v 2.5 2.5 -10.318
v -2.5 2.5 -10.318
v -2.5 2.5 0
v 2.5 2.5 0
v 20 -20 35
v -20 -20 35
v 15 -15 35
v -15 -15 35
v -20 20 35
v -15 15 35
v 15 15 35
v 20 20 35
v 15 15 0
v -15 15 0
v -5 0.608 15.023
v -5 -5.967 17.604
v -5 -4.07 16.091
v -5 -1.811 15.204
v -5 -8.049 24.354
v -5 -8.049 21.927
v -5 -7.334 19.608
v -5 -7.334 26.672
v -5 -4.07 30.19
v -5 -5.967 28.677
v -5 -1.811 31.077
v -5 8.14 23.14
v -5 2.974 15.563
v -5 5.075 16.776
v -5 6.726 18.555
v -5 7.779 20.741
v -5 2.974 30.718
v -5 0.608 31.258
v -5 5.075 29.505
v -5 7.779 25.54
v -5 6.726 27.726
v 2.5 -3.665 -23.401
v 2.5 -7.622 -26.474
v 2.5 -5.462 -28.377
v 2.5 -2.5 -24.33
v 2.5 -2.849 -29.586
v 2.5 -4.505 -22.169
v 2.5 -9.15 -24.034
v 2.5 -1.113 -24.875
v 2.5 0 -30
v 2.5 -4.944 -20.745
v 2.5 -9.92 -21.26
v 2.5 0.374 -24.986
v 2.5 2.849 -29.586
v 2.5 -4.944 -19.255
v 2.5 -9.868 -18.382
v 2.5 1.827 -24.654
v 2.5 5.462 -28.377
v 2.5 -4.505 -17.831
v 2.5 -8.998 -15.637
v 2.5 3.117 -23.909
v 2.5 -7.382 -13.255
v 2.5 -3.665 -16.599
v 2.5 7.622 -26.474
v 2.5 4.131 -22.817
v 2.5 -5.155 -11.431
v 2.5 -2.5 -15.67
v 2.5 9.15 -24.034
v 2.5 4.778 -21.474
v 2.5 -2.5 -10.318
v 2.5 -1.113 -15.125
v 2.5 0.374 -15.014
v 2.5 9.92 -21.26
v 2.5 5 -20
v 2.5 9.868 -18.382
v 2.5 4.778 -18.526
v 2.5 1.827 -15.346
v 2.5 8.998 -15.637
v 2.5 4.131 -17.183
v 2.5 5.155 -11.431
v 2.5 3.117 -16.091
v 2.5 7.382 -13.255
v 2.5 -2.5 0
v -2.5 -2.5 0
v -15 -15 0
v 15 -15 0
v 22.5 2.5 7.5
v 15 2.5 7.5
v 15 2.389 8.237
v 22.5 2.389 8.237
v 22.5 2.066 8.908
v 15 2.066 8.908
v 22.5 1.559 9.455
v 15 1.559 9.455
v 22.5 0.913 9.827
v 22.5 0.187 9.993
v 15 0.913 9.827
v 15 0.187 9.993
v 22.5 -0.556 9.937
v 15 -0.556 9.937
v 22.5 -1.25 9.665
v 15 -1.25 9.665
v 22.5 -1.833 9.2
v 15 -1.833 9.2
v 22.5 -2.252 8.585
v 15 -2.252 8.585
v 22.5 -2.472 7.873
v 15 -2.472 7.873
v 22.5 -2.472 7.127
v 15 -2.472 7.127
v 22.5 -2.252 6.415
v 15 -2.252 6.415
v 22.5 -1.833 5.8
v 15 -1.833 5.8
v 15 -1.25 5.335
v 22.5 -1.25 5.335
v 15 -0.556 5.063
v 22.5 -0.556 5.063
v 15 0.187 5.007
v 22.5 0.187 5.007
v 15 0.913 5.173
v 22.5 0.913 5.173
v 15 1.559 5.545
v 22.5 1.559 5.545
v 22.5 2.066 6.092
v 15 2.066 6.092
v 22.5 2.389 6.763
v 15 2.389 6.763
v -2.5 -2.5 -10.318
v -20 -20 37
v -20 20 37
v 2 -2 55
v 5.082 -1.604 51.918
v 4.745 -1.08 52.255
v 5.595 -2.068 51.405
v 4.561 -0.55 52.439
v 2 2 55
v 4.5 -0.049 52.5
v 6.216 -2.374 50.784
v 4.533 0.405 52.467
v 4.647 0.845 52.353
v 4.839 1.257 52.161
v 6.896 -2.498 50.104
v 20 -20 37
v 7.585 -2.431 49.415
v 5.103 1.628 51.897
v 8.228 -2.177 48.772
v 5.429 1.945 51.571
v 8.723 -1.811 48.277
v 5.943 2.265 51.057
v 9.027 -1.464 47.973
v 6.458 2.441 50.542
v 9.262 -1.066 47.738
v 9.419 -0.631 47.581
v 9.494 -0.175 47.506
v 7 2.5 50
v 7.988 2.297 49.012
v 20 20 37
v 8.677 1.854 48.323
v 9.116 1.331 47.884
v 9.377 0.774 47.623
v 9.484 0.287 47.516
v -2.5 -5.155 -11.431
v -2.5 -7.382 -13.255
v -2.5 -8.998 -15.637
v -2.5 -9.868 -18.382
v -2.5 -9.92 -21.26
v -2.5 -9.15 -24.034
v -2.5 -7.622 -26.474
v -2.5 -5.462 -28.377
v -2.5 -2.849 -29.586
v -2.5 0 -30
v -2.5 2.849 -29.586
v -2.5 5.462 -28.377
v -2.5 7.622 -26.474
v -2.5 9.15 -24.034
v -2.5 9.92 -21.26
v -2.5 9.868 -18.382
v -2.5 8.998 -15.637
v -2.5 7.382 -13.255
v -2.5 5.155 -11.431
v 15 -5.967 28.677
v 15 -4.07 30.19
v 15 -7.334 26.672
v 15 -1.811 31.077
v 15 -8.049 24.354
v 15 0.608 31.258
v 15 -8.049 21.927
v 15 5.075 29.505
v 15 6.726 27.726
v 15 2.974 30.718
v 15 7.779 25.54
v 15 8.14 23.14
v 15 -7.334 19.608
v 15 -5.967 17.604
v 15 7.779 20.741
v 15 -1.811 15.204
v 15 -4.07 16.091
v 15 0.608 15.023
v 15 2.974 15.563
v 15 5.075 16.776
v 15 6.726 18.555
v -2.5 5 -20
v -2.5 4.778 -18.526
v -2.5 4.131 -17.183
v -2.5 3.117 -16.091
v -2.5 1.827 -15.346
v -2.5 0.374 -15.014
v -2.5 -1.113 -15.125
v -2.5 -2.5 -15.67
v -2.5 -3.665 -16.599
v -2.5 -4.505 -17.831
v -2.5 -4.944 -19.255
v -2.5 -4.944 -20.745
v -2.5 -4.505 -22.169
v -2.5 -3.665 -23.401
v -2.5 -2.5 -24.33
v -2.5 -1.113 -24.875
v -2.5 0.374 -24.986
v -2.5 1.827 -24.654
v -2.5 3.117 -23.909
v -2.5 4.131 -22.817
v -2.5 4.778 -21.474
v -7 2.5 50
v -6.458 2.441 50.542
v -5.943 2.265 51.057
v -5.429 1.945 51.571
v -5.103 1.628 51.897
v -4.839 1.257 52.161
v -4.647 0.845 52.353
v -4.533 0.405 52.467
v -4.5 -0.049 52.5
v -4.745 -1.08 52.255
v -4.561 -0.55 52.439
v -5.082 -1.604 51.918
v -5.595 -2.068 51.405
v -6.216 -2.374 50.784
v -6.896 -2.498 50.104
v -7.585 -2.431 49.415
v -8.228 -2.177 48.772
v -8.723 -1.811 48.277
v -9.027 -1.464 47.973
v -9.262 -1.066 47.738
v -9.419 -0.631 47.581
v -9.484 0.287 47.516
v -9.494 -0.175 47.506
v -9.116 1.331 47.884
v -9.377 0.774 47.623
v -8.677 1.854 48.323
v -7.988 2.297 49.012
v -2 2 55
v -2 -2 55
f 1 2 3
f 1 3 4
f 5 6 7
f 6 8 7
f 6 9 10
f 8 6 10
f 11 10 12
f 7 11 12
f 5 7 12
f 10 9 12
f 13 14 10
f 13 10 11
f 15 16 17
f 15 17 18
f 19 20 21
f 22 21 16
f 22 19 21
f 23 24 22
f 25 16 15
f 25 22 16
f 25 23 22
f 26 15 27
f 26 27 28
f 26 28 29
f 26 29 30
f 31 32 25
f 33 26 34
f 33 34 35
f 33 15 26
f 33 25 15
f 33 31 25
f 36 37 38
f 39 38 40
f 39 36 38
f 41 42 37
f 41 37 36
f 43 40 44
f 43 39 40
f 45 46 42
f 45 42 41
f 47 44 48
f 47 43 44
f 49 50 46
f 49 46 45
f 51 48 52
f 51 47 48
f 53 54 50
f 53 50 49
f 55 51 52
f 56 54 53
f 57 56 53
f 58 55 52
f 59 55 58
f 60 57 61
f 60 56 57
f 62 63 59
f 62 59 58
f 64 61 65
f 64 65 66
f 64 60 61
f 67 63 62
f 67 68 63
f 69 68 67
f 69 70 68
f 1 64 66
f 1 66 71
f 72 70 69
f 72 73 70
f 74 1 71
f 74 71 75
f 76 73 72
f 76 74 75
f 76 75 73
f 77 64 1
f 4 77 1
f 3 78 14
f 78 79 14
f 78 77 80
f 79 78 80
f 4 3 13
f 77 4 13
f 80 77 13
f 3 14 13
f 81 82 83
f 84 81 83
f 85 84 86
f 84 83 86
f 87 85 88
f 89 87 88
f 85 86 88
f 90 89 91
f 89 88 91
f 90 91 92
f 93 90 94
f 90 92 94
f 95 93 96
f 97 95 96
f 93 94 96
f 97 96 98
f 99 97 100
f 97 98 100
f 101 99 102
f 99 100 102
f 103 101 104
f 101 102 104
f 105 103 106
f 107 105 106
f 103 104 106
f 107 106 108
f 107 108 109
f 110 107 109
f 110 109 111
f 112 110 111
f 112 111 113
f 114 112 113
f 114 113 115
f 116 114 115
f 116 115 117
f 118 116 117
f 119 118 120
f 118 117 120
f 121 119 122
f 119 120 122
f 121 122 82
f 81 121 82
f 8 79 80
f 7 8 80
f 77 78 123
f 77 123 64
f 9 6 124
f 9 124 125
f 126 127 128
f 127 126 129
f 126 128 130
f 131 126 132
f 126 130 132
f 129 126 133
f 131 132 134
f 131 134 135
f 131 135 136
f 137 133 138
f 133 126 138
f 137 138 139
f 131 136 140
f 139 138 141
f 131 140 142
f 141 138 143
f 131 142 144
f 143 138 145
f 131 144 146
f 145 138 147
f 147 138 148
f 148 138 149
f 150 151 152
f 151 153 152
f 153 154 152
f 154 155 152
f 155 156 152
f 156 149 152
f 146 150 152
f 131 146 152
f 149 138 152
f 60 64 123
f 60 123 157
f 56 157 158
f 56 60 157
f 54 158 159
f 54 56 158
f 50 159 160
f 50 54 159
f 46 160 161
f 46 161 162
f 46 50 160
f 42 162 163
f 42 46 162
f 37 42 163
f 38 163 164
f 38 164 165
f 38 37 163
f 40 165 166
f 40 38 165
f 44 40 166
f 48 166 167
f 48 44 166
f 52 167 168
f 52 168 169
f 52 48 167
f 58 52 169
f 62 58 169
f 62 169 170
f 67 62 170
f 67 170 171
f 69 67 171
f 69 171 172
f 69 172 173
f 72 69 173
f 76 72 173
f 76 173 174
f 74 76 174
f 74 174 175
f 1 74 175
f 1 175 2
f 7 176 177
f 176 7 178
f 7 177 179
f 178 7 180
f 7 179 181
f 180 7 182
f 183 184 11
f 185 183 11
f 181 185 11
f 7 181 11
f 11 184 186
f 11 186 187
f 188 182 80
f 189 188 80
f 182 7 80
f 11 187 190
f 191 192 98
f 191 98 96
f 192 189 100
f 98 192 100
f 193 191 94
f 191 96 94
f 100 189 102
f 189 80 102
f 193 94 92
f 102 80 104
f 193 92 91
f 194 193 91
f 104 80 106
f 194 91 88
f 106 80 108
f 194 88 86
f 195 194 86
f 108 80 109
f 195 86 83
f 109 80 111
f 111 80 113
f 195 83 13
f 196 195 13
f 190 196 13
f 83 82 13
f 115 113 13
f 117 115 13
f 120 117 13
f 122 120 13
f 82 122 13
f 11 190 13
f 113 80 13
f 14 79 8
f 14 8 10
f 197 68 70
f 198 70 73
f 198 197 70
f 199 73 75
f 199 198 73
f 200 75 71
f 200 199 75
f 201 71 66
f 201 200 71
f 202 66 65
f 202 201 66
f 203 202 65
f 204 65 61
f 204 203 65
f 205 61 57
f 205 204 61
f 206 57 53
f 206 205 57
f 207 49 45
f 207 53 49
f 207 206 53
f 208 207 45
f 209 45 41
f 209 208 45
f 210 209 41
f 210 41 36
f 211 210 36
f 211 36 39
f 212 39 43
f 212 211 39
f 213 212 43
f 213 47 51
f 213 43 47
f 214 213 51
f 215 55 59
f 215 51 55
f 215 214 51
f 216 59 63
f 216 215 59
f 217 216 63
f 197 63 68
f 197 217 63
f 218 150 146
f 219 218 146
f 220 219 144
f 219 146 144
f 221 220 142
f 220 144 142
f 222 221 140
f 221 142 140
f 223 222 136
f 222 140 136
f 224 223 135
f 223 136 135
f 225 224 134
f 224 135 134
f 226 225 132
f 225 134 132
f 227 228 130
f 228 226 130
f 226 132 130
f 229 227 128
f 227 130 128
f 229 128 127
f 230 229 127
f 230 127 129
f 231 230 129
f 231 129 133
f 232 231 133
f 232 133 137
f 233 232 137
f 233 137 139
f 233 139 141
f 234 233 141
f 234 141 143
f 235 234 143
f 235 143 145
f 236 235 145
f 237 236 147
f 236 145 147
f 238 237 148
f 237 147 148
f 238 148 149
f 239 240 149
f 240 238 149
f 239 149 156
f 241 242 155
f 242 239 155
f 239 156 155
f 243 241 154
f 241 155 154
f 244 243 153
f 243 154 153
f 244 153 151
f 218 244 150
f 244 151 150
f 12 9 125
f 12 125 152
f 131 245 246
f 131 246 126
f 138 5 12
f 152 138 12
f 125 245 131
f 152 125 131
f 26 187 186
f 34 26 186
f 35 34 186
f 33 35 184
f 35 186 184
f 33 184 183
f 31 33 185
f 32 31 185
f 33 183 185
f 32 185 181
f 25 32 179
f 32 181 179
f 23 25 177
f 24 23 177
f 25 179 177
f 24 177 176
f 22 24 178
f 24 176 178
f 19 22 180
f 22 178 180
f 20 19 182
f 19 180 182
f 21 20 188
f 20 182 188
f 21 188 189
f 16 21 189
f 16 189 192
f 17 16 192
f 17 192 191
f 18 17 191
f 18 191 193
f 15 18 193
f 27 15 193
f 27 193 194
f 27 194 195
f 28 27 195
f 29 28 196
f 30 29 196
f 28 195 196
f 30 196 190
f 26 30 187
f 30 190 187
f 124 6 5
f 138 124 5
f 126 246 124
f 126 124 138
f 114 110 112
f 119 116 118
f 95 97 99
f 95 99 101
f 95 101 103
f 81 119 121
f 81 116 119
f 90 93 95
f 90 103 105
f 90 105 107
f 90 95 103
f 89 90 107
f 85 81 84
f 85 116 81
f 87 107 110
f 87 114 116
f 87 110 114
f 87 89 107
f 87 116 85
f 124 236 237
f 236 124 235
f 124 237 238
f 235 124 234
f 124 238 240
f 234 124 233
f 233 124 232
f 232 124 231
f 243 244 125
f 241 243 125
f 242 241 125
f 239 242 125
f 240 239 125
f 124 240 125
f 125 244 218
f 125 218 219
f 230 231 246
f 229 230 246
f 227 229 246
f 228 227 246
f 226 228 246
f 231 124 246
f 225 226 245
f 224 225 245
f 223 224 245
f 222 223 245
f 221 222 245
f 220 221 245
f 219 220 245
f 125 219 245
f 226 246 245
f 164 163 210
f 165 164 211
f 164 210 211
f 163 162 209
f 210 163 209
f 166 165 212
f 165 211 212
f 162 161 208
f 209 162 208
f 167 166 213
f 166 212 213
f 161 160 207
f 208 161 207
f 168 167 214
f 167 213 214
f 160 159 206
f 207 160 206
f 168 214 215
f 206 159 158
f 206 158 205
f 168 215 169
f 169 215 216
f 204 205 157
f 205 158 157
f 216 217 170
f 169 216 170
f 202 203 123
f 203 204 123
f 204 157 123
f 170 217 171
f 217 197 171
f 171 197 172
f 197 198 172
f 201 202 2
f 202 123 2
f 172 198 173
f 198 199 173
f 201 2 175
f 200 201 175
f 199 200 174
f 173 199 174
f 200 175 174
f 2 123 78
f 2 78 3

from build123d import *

# Parameters (mm, degrees)
F0_W      = 30
F0_H      = 30
F1_DEPTH  = 35
F2_W      = 40
F2_H      = 40
F3_DEPTH  = 20
F4_SIZE   = 18
F5_R      = 8.1403588374
F6_DEPTH  = 20
F7_R      = 2.5
F8_DEPTH  = 7.5
F9_R      = 2.5
F10_DEPTH = 79.502
F11_W     = 5
F11_H     = 5
F12_DEPTH = 15
F13_R     = 10
F13_R_2   = 5
F14_DEPTH = 2.5


# Not quite as in the source:
# - a feature names something its author has since deleted; it is built from what else it names


with BuildPart() as f1:
    # F0 (on Top) → F1 (new body)
    with BuildSketch(Plane.XY):
        Rectangle(F0_W, F0_H)
    extrude(amount=F1_DEPTH)

    # F2 (on face) → F3 (join)
    with BuildSketch(Plane.XY.offset(35)):
        Rectangle(F2_W, F2_H)
    extrude(amount=F3_DEPTH)

    # F4
    f4_edges = [f1.edges().sort_by_distance(p)[0] for p in [
        (20, 0, 55),
        (0, 20, 55),
        (-20, 0, 55),
        (0, -20, 55),
    ]]
    chamfer(f4_edges, length=F4_SIZE)

    # F5 (on face) → F6 (cut)
    with BuildSketch(Plane.YZ.offset(15)):
        with Locations((0, 23.1403588374)):
            Circle(F5_R)
    extrude(amount=-F6_DEPTH, mode=Mode.SUBTRACT)

    # F7 (on face) → F8 (join)
    with BuildSketch(Plane.YZ.offset(15)):
        with Locations((0, 7.5)):
            Circle(F7_R)
    extrude(amount=F8_DEPTH)

    # F9 (on face) → F10 (cut)
    with BuildSketch(Plane.YZ.offset(20)):
        with Locations((0, 50)):
            Circle(F9_R)
    extrude(amount=-F10_DEPTH, mode=Mode.SUBTRACT)

    # F11 (on face) → F12 (join)
    with BuildSketch(Plane(origin=(0, 0, 0), x_dir=(1, 0, 0), z_dir=(0, 0, -1))):
        Rectangle(F11_W, F11_H)
    extrude(amount=F12_DEPTH)

    # F13 (on Right) → F14 (join, symmetric)
    with BuildSketch(Plane.YZ):
        with Locations((0, -20)):
            Circle(F13_R)
        with Locations((0, -20)):
            Circle(F13_R_2, mode=Mode.SUBTRACT)
    extrude(amount=F14_DEPTH, both=True)


solid = f1.part
